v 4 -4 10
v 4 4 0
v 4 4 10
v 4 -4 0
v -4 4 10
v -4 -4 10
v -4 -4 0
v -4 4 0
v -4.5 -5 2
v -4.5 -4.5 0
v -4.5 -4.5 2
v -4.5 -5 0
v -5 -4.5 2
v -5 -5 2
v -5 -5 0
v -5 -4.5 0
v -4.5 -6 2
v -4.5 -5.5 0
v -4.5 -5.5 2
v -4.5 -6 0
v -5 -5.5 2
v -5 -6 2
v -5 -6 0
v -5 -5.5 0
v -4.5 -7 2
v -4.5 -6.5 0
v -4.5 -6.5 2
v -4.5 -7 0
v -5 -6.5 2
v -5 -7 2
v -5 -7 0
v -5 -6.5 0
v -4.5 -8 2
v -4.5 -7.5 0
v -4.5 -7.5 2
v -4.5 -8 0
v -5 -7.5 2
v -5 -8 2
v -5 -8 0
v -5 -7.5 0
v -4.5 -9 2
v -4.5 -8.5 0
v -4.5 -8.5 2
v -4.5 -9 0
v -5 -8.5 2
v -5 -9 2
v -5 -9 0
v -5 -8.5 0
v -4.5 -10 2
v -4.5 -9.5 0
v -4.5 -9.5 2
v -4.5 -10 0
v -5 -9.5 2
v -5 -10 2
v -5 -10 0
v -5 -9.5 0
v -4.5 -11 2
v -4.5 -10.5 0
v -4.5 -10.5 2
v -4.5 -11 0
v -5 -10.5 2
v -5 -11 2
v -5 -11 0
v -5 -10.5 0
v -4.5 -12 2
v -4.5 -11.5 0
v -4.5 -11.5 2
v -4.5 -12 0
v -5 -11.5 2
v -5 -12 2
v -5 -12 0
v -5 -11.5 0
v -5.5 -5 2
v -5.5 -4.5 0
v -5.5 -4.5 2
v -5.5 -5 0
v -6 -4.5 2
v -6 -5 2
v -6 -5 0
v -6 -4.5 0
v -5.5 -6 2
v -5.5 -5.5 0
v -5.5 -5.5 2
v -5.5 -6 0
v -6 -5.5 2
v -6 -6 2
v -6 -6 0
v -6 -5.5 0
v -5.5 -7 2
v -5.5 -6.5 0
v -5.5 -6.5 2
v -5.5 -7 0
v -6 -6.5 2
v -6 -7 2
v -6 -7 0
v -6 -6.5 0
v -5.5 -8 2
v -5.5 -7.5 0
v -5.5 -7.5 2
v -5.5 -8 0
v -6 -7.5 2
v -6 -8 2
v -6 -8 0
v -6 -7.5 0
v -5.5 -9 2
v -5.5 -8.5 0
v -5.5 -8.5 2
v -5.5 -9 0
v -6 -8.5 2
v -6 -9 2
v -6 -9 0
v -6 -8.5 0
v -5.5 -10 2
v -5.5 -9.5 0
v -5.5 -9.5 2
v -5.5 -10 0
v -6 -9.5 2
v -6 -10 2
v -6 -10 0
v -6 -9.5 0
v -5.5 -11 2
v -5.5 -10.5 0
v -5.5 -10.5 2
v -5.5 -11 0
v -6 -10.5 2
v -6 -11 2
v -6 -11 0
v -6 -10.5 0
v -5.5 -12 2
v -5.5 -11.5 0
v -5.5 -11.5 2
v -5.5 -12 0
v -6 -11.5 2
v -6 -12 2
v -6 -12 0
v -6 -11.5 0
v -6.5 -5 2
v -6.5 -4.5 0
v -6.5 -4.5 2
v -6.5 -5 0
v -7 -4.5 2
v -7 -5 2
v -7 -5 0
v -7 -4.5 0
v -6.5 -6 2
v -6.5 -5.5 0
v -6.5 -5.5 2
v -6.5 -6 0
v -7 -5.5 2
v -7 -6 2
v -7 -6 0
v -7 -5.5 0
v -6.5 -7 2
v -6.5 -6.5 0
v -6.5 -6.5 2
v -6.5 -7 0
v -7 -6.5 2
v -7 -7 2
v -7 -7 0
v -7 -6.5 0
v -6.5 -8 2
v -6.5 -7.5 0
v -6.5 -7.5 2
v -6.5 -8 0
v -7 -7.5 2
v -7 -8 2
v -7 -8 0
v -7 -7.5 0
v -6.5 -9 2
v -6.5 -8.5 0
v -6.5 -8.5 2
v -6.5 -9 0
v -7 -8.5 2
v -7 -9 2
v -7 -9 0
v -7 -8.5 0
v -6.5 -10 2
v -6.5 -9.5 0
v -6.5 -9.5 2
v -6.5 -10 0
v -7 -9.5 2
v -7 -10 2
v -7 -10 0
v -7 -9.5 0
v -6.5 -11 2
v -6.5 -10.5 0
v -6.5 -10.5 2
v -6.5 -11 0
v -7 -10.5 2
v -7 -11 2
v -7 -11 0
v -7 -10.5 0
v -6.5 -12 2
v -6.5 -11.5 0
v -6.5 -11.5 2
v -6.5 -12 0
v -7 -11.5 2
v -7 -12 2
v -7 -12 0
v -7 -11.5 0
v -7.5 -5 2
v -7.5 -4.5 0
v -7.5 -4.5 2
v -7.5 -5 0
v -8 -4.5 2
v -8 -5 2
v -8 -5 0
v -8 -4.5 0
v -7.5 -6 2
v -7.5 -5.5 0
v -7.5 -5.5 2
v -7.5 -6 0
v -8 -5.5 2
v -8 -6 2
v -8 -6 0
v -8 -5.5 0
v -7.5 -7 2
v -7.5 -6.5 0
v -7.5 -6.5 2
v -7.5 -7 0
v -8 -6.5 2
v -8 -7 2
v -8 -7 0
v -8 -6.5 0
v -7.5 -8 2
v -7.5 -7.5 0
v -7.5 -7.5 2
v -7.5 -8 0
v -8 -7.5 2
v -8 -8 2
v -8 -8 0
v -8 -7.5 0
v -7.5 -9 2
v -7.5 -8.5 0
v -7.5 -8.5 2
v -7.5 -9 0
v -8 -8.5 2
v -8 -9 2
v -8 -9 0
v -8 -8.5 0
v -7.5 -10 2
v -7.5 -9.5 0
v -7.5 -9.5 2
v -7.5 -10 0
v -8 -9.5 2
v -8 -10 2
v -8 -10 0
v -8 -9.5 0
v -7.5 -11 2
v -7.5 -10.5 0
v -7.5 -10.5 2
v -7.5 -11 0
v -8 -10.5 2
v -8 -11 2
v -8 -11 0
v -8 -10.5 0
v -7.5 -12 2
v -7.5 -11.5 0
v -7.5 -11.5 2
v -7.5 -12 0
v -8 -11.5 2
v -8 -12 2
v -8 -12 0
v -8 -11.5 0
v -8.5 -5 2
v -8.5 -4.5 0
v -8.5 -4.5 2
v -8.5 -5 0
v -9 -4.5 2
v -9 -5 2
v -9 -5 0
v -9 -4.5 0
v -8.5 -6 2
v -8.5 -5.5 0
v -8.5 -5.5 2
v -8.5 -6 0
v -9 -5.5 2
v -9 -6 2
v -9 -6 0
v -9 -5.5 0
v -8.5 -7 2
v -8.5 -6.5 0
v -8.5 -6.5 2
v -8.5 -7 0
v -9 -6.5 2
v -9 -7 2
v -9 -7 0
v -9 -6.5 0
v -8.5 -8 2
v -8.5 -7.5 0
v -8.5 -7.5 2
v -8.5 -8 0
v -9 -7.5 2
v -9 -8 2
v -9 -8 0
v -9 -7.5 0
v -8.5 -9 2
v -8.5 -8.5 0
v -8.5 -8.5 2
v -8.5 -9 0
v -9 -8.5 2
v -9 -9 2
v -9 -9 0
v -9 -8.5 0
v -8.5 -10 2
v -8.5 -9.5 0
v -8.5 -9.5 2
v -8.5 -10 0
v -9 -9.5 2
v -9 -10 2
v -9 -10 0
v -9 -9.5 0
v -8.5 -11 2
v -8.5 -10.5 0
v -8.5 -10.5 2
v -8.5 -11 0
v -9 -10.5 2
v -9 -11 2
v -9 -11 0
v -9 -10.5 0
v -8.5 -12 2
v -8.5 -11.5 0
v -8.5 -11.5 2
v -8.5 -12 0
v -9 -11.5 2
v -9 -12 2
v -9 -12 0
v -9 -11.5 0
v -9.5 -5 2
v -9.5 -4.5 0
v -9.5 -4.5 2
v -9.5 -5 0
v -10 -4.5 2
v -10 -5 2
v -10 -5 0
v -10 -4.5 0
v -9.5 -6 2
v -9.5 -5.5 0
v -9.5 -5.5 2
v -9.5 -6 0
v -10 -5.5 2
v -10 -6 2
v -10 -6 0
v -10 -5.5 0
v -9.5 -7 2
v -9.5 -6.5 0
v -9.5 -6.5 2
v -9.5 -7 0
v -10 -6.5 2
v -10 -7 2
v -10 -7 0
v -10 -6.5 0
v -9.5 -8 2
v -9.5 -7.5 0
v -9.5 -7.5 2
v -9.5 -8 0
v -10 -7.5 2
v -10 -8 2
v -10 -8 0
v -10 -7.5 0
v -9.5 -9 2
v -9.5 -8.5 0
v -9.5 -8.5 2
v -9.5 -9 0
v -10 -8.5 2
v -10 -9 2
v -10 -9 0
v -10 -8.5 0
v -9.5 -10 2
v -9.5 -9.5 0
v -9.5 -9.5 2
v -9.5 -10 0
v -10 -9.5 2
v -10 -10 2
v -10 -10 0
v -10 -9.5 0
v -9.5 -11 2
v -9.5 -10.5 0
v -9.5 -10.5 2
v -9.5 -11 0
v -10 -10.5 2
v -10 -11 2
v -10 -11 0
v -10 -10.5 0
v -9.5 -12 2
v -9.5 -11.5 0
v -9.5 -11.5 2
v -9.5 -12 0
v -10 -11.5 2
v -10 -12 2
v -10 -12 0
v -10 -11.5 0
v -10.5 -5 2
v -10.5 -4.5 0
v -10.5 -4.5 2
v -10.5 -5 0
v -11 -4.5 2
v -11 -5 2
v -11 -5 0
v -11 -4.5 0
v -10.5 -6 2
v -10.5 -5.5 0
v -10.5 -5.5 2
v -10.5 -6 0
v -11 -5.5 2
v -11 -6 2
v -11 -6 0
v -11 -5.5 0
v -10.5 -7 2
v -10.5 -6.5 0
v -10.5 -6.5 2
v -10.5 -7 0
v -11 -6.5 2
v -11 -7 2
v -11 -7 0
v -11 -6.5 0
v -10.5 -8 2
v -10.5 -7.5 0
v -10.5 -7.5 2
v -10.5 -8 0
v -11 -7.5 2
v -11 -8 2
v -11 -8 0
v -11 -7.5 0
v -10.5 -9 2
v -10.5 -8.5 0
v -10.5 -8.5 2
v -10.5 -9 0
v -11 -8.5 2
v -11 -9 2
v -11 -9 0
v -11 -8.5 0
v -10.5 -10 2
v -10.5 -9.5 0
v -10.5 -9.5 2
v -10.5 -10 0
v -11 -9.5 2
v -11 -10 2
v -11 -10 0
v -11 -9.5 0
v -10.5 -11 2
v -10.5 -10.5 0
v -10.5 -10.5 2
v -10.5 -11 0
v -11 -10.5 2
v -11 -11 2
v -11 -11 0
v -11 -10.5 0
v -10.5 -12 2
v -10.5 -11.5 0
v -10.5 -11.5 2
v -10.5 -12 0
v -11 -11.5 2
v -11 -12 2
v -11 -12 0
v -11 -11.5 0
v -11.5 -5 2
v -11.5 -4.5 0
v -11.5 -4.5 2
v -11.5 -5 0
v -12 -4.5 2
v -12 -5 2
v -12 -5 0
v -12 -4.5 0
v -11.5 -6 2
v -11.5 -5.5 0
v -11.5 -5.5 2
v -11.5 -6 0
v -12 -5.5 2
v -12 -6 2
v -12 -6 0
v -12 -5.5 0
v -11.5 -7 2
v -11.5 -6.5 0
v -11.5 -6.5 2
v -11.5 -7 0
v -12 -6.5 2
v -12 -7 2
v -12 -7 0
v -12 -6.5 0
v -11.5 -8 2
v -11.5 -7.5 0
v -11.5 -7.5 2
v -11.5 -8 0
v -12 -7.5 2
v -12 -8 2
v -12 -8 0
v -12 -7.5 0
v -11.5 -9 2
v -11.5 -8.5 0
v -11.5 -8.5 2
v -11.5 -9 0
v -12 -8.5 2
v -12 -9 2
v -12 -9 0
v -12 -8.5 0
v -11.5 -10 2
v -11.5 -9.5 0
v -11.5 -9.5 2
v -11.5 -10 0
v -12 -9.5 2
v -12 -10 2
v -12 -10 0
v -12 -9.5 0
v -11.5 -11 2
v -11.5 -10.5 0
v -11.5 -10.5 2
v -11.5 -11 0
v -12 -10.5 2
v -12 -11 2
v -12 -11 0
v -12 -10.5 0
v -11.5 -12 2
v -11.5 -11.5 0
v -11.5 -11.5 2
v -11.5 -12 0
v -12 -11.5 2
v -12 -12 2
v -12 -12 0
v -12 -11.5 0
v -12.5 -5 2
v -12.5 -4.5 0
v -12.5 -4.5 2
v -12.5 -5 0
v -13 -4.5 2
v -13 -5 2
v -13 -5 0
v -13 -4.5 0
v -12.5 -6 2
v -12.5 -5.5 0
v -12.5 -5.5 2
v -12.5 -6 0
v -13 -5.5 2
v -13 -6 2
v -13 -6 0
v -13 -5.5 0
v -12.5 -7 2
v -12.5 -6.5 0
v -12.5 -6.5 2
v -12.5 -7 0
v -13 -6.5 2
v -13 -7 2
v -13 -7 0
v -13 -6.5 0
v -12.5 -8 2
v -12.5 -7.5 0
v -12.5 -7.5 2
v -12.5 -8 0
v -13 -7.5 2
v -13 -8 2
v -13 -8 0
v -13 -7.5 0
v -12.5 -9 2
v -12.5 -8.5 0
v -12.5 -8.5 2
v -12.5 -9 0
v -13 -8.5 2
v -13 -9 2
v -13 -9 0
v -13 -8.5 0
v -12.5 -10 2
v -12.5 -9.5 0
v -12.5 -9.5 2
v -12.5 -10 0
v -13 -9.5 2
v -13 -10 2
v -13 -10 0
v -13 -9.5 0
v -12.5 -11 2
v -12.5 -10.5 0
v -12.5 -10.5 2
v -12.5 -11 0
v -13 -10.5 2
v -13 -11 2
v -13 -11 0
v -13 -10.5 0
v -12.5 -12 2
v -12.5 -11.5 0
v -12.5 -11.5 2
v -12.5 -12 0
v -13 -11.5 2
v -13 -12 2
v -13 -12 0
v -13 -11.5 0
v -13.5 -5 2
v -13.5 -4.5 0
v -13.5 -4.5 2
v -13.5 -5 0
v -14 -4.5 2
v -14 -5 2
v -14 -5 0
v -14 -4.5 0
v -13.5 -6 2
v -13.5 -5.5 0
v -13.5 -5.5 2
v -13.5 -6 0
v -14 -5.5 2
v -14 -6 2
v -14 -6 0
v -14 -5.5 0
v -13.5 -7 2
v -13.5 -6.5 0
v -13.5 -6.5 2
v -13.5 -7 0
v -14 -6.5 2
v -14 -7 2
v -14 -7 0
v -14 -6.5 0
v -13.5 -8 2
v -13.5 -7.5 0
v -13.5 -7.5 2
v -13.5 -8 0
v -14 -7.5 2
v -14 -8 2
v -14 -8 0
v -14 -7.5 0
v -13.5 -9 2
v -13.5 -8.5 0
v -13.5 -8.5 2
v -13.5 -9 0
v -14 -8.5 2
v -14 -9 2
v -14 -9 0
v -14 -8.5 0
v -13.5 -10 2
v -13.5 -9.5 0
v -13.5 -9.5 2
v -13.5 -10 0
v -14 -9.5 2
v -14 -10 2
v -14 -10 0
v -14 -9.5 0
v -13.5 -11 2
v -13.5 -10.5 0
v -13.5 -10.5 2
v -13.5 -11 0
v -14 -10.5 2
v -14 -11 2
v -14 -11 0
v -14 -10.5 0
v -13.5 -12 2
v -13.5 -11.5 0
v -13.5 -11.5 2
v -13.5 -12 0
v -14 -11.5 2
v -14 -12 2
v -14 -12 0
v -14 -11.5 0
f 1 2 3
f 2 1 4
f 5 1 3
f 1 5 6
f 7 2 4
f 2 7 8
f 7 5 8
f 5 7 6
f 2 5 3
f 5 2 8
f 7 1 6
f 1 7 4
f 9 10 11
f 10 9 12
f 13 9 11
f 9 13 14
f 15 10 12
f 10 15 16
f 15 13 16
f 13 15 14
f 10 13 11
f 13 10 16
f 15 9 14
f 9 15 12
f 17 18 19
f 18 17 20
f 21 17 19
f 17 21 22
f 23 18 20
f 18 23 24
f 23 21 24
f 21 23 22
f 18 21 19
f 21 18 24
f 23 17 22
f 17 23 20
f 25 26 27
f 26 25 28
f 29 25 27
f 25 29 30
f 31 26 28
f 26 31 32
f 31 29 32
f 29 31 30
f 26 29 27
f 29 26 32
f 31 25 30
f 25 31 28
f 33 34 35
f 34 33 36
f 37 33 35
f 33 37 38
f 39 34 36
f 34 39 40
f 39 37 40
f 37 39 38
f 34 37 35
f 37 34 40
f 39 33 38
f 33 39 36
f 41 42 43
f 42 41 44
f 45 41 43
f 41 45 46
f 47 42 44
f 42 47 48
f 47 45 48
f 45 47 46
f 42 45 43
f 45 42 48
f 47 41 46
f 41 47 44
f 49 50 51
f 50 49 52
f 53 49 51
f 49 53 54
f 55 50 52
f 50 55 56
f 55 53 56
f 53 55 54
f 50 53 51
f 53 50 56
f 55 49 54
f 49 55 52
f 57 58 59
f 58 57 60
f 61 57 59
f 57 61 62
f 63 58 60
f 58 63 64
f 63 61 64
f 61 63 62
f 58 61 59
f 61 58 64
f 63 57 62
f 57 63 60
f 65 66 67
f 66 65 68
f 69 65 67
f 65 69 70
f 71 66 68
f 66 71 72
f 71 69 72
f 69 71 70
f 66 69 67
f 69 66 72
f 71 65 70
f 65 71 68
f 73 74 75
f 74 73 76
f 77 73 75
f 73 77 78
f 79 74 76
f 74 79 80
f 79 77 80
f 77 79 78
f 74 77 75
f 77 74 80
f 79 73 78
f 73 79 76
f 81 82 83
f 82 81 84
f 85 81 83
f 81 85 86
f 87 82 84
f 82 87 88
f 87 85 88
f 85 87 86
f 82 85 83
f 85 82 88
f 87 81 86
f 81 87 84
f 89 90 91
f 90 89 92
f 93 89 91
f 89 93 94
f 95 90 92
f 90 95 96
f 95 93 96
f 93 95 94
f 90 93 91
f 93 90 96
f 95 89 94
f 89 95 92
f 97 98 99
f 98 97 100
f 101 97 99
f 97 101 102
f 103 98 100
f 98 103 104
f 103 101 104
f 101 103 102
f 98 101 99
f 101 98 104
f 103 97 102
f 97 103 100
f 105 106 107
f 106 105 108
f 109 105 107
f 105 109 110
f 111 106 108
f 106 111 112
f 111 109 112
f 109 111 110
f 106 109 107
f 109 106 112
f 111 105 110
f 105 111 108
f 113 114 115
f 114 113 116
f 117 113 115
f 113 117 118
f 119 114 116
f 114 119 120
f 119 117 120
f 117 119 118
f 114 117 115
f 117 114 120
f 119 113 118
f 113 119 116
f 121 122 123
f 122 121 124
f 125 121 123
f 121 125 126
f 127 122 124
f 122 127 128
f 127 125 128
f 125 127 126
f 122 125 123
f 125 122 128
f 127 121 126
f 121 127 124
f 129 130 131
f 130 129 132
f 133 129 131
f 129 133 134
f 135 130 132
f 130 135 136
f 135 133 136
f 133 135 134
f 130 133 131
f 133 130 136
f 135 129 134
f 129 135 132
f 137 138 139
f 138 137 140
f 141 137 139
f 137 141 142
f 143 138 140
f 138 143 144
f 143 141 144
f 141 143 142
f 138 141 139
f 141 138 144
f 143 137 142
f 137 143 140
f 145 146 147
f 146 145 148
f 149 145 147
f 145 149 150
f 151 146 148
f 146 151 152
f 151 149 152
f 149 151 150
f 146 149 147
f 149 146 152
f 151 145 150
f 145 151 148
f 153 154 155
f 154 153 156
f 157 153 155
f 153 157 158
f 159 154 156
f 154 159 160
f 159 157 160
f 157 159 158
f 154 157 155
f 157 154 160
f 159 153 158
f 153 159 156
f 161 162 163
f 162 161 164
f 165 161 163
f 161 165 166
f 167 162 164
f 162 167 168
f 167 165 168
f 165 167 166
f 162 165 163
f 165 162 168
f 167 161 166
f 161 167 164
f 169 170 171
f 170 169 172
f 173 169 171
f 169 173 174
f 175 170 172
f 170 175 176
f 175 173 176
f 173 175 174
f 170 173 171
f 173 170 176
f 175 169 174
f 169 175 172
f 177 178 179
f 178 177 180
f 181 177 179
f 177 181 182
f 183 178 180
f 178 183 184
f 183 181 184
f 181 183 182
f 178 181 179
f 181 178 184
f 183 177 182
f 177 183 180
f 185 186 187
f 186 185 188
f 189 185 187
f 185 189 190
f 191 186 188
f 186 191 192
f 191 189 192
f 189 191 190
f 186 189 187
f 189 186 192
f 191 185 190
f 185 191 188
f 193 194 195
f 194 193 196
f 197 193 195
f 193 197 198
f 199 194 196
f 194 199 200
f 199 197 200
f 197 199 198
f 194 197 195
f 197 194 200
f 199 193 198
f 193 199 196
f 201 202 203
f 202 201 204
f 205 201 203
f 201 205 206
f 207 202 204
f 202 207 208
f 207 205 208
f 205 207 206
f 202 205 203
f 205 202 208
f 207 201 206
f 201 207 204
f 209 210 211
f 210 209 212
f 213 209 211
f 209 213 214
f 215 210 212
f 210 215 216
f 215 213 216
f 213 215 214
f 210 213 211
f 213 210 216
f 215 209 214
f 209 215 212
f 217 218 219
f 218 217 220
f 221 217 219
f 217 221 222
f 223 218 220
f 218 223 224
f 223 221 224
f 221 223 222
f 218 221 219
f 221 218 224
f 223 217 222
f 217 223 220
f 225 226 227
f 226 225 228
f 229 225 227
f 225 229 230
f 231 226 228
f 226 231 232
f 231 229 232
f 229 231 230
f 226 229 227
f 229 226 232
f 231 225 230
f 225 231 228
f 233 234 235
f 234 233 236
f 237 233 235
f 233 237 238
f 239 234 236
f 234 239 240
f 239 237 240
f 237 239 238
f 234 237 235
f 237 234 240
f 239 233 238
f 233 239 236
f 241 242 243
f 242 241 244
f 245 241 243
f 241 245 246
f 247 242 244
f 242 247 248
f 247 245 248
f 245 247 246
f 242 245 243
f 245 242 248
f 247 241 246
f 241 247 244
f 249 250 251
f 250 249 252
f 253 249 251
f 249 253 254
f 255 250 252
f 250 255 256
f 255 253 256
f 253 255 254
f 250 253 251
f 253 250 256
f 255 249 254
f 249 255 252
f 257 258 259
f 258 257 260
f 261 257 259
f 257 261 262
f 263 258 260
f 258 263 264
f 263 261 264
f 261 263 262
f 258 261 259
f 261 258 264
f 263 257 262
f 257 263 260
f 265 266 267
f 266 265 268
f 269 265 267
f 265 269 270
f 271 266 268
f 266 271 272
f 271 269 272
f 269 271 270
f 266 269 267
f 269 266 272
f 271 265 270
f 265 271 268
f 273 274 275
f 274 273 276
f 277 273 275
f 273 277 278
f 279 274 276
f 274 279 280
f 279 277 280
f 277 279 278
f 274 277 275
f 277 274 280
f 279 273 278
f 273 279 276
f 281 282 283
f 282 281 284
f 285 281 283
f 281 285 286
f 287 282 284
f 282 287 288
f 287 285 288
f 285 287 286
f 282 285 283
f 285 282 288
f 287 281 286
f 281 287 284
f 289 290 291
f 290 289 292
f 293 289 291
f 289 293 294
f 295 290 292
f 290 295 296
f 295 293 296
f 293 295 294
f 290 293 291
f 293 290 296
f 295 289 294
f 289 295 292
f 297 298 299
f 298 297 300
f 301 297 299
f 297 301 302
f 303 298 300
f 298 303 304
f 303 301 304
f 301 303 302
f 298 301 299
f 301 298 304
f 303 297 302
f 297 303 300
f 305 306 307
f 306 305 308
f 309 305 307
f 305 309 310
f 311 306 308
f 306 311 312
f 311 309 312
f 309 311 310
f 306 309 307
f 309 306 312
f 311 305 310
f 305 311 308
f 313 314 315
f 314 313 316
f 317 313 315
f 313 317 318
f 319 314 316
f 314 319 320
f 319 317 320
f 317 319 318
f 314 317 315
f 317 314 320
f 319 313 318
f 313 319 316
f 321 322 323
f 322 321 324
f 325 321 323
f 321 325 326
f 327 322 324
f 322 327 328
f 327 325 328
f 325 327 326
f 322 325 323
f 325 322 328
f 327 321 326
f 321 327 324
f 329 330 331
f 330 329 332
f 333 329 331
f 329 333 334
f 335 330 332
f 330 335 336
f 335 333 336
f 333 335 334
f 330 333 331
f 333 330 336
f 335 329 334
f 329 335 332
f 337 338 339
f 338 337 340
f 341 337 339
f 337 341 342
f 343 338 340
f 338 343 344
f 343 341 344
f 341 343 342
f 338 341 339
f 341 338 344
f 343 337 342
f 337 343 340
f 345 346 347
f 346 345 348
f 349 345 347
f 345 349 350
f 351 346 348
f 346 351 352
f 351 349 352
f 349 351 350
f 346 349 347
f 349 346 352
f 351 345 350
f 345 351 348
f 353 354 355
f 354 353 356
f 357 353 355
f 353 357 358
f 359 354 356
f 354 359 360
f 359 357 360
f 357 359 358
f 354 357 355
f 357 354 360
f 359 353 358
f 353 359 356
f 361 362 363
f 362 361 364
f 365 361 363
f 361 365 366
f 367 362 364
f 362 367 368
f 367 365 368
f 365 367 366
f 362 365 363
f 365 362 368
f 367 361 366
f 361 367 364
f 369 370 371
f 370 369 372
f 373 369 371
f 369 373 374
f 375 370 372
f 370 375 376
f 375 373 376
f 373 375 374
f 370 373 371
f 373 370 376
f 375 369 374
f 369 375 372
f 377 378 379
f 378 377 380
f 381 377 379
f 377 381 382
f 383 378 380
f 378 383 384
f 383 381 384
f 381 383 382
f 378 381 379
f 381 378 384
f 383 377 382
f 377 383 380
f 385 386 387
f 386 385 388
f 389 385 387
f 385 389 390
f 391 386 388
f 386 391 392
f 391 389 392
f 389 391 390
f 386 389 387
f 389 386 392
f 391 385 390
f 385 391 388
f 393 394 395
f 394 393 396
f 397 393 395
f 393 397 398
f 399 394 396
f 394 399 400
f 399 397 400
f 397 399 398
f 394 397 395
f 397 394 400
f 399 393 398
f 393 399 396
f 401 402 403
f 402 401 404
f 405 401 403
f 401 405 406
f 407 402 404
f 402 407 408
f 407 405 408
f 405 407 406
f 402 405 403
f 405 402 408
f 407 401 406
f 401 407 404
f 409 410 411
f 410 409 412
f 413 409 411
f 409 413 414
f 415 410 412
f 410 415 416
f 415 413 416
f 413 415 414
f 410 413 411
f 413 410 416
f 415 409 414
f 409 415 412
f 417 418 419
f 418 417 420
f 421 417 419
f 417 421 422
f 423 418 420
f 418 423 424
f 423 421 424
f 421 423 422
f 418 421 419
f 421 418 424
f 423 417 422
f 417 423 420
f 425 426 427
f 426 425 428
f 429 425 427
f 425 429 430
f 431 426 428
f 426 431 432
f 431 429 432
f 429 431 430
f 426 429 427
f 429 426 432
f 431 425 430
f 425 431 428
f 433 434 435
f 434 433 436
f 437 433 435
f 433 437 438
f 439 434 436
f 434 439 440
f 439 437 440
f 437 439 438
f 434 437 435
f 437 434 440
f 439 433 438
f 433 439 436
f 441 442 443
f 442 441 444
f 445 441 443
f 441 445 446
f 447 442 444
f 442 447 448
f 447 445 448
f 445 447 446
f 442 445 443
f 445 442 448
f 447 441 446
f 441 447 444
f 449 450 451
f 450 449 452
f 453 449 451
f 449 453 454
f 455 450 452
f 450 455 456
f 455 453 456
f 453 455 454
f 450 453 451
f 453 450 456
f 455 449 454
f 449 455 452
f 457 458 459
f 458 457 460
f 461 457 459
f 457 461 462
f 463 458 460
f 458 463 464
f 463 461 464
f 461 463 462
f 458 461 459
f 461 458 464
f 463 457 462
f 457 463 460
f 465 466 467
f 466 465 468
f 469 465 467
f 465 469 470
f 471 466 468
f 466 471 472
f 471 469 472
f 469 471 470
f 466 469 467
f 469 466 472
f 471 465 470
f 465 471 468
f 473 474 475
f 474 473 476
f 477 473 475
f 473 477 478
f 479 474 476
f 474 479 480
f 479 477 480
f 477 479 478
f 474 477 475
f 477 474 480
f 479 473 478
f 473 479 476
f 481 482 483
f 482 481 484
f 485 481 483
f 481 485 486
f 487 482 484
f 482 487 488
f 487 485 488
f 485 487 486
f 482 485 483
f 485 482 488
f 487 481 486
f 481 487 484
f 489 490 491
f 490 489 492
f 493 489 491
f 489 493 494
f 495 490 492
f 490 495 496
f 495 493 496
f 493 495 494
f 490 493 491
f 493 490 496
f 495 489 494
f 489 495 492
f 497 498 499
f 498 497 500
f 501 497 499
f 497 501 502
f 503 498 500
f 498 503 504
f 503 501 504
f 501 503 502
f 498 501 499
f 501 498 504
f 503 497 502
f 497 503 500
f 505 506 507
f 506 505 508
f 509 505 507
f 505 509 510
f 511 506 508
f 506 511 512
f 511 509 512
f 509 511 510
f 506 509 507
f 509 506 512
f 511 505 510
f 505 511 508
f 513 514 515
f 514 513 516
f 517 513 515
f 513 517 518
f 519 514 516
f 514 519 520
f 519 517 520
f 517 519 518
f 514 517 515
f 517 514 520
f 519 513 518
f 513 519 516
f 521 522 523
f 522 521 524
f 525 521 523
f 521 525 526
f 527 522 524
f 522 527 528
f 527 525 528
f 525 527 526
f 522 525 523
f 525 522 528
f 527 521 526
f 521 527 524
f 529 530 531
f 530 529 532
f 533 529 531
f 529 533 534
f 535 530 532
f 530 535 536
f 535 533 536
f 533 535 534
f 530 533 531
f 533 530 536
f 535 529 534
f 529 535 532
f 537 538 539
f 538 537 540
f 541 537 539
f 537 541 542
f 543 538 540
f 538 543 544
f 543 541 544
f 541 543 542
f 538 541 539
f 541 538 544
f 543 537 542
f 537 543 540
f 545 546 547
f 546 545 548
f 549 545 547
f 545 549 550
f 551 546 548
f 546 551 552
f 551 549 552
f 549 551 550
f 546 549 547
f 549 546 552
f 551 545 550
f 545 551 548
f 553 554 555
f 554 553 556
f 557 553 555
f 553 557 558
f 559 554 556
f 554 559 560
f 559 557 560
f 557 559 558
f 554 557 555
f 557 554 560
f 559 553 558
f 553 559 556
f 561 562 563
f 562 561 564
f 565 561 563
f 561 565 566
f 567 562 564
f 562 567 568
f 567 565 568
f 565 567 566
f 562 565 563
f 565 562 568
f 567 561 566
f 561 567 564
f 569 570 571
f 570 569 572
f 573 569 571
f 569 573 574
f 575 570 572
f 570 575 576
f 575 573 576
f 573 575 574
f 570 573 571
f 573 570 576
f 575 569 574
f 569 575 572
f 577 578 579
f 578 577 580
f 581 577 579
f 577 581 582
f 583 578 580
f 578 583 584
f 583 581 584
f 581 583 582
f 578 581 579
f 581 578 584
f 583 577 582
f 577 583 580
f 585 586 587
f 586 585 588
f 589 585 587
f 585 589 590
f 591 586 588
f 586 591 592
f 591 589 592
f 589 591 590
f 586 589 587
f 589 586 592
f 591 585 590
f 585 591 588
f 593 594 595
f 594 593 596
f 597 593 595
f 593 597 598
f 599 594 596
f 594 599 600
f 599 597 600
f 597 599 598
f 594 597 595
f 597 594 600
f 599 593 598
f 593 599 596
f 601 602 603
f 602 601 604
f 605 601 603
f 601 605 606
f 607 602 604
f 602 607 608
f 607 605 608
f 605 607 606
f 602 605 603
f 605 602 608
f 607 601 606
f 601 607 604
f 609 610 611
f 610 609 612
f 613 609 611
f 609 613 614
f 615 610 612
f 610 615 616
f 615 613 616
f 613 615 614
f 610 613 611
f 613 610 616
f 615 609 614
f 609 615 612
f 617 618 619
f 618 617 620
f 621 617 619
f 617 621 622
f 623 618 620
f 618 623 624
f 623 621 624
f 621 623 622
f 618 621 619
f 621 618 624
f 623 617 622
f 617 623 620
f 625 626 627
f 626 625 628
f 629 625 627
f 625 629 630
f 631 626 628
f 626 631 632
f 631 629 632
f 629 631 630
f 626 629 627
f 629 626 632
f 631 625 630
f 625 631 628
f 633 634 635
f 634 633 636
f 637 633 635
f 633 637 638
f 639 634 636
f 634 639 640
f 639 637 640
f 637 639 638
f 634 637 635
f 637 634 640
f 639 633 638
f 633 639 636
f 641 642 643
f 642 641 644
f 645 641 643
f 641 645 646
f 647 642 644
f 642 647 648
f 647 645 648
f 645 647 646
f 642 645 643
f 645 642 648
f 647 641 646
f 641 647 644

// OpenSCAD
translate([0, 0, 5]) color([0,1,0,0.9]) cube([8, 8, 10], center=true);
translate([-4.75, -4.75, 1]) color([1,0,0]) cube([0.5, 0.5, 2], center=true);
translate([-4.75, -5.75, 1]) color([1,0,0]) cube([0.5, 0.5, 2], center=true);
translate([-4.75, -6.75, 1]) color([1,0,0]) cube([0.5, 0.5, 2], center=true);
translate([-4.75, -7.75, 1]) color([1,0,0]) cube([0.5, 0.5, 2], center=true);
translate([-4.75, -8.75, 1]) color([1,0,0]) cube([0.5, 0.5, 2], center=true);
translate([-4.75, -9.75, 1]) color([1,0,0]) cube([0.5, 0.5, 2], center=true);
translate([-4.75, -10.75, 1]) color([1,0,0]) cube([0.5, 0.5, 2], center=true);
translate([-4.75, -11.75, 1]) color([1,0,0]) cube([0.5, 0.5, 2], center=true);
translate([-5.75, -4.75, 1]) color([1,0,0]) cube([0.5, 0.5, 2], center=true);
translate([-5.75, -5.75, 1]) color([1,0,0]) cube([0.5, 0.5, 2], center=true);
translate([-5.75, -6.75, 1]) color([1,0,0]) cube([0.5, 0.5, 2], center=true);
translate([-5.75, -7.75, 1]) color([1,0,0]) cube([0.5, 0.5, 2], center=true);
translate([-5.75, -8.75, 1]) color([1,0,0]) cube([0.5, 0.5, 2], center=true);
translate([-5.75, -9.75, 1]) color([1,0,0]) cube([0.5, 0.5, 2], center=true);
translate([-5.75, -10.75, 1]) color([1,0,0]) cube([0.5, 0.5, 2], center=true);
translate([-5.75, -11.75, 1]) color([1,0,0]) cube([0.5, 0.5, 2], center=true);
translate([-6.75, -4.75, 1]) color([1,0,0]) cube([0.5, 0.5, 2], center=true);
translate([-6.75, -5.75, 1]) color([1,0,0]) cube([0.5, 0.5, 2], center=true);
translate([-6.75, -6.75, 1]) color([1,0,0]) cube([0.5, 0.5, 2], center=true);
translate([-6.75, -7.75, 1]) color([1,0,0]) cube([0.5, 0.5, 2], center=true);
translate([-6.75, -8.75, 1]) color([1,0,0]) cube([0.5, 0.5, 2], center=true);
translate([-6.75, -9.75, 1]) color([1,0,0]) cube([0.5, 0.5, 2], center=true);
translate([-6.75, -10.75, 1]) color([1,0,0]) cube([0.5, 0.5, 2], center=true);
translate([-6.75, -11.75, 1]) color([1,0,0]) cube([0.5, 0.5, 2], center=true);
translate([-7.75, -4.75, 1]) color([1,0,0]) cube([0.5, 0.5, 2], center=true);
translate([-7.75, -5.75, 1]) color([1,0,0]) cube([0.5, 0.5, 2], center=true);
translate([-7.75, -6.75, 1]) color([1,0,0]) cube([0.5, 0.5, 2], center=true);
translate([-7.75, -7.75, 1]) color([1,0,0]) cube([0.5, 0.5, 2], center=true);
translate([-7.75, -8.75, 1]) color([1,0,0]) cube([0.5, 0.5, 2], center=true);
translate([-7.75, -9.75, 1]) color([1,0,0]) cube([0.5, 0.5, 2], center=true);
translate([-7.75, -10.75, 1]) color([1,0,0]) cube([0.5, 0.5, 2], center=true);
translate([-7.75, -11.75, 1]) color([1,0,0]) cube([0.5, 0.5, 2], center=true);
translate([-8.75, -4.75, 1]) color([1,0,0]) cube([0.5, 0.5, 2], center=true);
translate([-8.75, -5.75, 1]) color([1,0,0]) cube([0.5, 0.5, 2], center=true);
translate([-8.75, -6.75, 1]) color([1,0,0]) cube([0.5, 0.5, 2], center=true);
translate([-8.75, -7.75, 1]) color([1,0,0]) cube([0.5, 0.5, 2], center=true);
translate([-8.75, -8.75, 1]) color([1,0,0]) cube([0.5, 0.5, 2], center=true);
translate([-8.75, -9.75, 1]) color([1,0,0]) cube([0.5, 0.5, 2], center=true);
translate([-8.75, -10.75, 1]) color([1,0,0]) cube([0.5, 0.5, 2], center=true);
translate([-8.75, -11.75, 1]) color([1,0,0]) cube([0.5, 0.5, 2], center=true);
translate([-9.75, -4.75, 1]) color([1,0,0]) cube([0.5, 0.5, 2], center=true);
translate([-9.75, -5.75, 1]) color([1,0,0]) cube([0.5, 0.5, 2], center=true);
translate([-9.75, -6.75, 1]) color([1,0,0]) cube([0.5, 0.5, 2], center=true);
translate([-9.75, -7.75, 1]) color([1,0,0]) cube([0.5, 0.5, 2], center=true);
translate([-9.75, -8.75, 1]) color([1,0,0]) cube([0.5, 0.5, 2], center=true);
translate([-9.75, -9.75, 1]) color([1,0,0]) cube([0.5, 0.5, 2], center=true);
translate([-9.75, -10.75, 1]) color([1,0,0]) cube([0.5, 0.5, 2], center=true);
translate([-9.75, -11.75, 1]) color([1,0,0]) cube([0.5, 0.5, 2], center=true);
translate([-10.75, -4.75, 1]) color([1,0,0]) cube([0.5, 0.5, 2], center=true);
translate([-10.75, -5.75, 1]) color([1,0,0]) cube([0.5, 0.5, 2], center=true);
translate([-10.75, -6.75, 1]) color([1,0,0]) cube([0.5, 0.5, 2], center=true);
translate([-10.75, -7.75, 1]) color([1,0,0]) cube([0.5, 0.5, 2], center=true);
translate([-10.75, -8.75, 1]) color([1,0,0]) cube([0.5, 0.5, 2], center=true);
translate([-10.75, -9.75, 1]) color([1,0,0]) cube([0.5, 0.5, 2], center=true);
translate([-10.75, -10.75, 1]) color([1,0,0]) cube([0.5, 0.5, 2], center=true);
translate([-10.75, -11.75, 1]) color([1,0,0]) cube([0.5, 0.5, 2], center=true);
translate([-11.75, -4.75, 1]) color([1,0,0]) cube([0.5, 0.5, 2], center=true);
translate([-11.75, -5.75, 1]) color([1,0,0]) cube([0.5, 0.5, 2], center=true);
translate([-11.75, -6.75, 1]) color([1,0,0]) cube([0.5, 0.5, 2], center=true);
translate([-11.75, -7.75, 1]) color([1,0,0]) cube([0.5, 0.5, 2], center=true);
translate([-11.75, -8.75, 1]) color([1,0,0]) cube([0.5, 0.5, 2], center=true);
translate([-11.75, -9.75, 1]) color([1,0,0]) cube([0.5, 0.5, 2], center=true);
translate([-11.75, -10.75, 1]) color([1,0,0]) cube([0.5, 0.5, 2], center=true);
translate([-11.75, -11.75, 1]) color([1,0,0]) cube([0.5, 0.5, 2], center=true);
translate([-12.75, -4.75, 1]) color([1,0,0]) cube([0.5, 0.5, 2], center=true);
translate([-12.75, -5.75, 1]) color([1,0,0]) cube([0.5, 0.5, 2], center=true);
translate([-12.75, -6.75, 1]) color([1,0,0]) cube([0.5, 0.5, 2], center=true);
translate([-12.75, -7.75, 1]) color([1,0,0]) cube([0.5, 0.5, 2], center=true);
translate([-12.75, -8.75, 1]) color([1,0,0]) cube([0.5, 0.5, 2], center=true);
translate([-12.75, -9.75, 1]) color([1,0,0]) cube([0.5, 0.5, 2], center=true);
translate([-12.75, -10.75, 1]) color([1,0,0]) cube([0.5, 0.5, 2], center=true);
translate([-12.75, -11.75, 1]) color([1,0,0]) cube([0.5, 0.5, 2], center=true);
translate([-13.75, -4.75, 1]) color([1,0,0]) cube([0.5, 0.5, 2], center=true);
translate([-13.75, -5.75, 1]) color([1,0,0]) cube([0.5, 0.5, 2], center=true);
translate([-13.75, -6.75, 1]) color([1,0,0]) cube([0.5, 0.5, 2], center=true);
translate([-13.75, -7.75, 1]) color([1,0,0]) cube([0.5, 0.5, 2], center=true);
translate([-13.75, -8.75, 1]) color([1,0,0]) cube([0.5, 0.5, 2], center=true);
translate([-13.75, -9.75, 1]) color([1,0,0]) cube([0.5, 0.5, 2], center=true);
translate([-13.75, -10.75, 1]) color([1,0,0]) cube([0.5, 0.5, 2], center=true);
translate([-13.75, -11.75, 1]) color([1,0,0]) cube([0.5, 0.5, 2], center=true);
